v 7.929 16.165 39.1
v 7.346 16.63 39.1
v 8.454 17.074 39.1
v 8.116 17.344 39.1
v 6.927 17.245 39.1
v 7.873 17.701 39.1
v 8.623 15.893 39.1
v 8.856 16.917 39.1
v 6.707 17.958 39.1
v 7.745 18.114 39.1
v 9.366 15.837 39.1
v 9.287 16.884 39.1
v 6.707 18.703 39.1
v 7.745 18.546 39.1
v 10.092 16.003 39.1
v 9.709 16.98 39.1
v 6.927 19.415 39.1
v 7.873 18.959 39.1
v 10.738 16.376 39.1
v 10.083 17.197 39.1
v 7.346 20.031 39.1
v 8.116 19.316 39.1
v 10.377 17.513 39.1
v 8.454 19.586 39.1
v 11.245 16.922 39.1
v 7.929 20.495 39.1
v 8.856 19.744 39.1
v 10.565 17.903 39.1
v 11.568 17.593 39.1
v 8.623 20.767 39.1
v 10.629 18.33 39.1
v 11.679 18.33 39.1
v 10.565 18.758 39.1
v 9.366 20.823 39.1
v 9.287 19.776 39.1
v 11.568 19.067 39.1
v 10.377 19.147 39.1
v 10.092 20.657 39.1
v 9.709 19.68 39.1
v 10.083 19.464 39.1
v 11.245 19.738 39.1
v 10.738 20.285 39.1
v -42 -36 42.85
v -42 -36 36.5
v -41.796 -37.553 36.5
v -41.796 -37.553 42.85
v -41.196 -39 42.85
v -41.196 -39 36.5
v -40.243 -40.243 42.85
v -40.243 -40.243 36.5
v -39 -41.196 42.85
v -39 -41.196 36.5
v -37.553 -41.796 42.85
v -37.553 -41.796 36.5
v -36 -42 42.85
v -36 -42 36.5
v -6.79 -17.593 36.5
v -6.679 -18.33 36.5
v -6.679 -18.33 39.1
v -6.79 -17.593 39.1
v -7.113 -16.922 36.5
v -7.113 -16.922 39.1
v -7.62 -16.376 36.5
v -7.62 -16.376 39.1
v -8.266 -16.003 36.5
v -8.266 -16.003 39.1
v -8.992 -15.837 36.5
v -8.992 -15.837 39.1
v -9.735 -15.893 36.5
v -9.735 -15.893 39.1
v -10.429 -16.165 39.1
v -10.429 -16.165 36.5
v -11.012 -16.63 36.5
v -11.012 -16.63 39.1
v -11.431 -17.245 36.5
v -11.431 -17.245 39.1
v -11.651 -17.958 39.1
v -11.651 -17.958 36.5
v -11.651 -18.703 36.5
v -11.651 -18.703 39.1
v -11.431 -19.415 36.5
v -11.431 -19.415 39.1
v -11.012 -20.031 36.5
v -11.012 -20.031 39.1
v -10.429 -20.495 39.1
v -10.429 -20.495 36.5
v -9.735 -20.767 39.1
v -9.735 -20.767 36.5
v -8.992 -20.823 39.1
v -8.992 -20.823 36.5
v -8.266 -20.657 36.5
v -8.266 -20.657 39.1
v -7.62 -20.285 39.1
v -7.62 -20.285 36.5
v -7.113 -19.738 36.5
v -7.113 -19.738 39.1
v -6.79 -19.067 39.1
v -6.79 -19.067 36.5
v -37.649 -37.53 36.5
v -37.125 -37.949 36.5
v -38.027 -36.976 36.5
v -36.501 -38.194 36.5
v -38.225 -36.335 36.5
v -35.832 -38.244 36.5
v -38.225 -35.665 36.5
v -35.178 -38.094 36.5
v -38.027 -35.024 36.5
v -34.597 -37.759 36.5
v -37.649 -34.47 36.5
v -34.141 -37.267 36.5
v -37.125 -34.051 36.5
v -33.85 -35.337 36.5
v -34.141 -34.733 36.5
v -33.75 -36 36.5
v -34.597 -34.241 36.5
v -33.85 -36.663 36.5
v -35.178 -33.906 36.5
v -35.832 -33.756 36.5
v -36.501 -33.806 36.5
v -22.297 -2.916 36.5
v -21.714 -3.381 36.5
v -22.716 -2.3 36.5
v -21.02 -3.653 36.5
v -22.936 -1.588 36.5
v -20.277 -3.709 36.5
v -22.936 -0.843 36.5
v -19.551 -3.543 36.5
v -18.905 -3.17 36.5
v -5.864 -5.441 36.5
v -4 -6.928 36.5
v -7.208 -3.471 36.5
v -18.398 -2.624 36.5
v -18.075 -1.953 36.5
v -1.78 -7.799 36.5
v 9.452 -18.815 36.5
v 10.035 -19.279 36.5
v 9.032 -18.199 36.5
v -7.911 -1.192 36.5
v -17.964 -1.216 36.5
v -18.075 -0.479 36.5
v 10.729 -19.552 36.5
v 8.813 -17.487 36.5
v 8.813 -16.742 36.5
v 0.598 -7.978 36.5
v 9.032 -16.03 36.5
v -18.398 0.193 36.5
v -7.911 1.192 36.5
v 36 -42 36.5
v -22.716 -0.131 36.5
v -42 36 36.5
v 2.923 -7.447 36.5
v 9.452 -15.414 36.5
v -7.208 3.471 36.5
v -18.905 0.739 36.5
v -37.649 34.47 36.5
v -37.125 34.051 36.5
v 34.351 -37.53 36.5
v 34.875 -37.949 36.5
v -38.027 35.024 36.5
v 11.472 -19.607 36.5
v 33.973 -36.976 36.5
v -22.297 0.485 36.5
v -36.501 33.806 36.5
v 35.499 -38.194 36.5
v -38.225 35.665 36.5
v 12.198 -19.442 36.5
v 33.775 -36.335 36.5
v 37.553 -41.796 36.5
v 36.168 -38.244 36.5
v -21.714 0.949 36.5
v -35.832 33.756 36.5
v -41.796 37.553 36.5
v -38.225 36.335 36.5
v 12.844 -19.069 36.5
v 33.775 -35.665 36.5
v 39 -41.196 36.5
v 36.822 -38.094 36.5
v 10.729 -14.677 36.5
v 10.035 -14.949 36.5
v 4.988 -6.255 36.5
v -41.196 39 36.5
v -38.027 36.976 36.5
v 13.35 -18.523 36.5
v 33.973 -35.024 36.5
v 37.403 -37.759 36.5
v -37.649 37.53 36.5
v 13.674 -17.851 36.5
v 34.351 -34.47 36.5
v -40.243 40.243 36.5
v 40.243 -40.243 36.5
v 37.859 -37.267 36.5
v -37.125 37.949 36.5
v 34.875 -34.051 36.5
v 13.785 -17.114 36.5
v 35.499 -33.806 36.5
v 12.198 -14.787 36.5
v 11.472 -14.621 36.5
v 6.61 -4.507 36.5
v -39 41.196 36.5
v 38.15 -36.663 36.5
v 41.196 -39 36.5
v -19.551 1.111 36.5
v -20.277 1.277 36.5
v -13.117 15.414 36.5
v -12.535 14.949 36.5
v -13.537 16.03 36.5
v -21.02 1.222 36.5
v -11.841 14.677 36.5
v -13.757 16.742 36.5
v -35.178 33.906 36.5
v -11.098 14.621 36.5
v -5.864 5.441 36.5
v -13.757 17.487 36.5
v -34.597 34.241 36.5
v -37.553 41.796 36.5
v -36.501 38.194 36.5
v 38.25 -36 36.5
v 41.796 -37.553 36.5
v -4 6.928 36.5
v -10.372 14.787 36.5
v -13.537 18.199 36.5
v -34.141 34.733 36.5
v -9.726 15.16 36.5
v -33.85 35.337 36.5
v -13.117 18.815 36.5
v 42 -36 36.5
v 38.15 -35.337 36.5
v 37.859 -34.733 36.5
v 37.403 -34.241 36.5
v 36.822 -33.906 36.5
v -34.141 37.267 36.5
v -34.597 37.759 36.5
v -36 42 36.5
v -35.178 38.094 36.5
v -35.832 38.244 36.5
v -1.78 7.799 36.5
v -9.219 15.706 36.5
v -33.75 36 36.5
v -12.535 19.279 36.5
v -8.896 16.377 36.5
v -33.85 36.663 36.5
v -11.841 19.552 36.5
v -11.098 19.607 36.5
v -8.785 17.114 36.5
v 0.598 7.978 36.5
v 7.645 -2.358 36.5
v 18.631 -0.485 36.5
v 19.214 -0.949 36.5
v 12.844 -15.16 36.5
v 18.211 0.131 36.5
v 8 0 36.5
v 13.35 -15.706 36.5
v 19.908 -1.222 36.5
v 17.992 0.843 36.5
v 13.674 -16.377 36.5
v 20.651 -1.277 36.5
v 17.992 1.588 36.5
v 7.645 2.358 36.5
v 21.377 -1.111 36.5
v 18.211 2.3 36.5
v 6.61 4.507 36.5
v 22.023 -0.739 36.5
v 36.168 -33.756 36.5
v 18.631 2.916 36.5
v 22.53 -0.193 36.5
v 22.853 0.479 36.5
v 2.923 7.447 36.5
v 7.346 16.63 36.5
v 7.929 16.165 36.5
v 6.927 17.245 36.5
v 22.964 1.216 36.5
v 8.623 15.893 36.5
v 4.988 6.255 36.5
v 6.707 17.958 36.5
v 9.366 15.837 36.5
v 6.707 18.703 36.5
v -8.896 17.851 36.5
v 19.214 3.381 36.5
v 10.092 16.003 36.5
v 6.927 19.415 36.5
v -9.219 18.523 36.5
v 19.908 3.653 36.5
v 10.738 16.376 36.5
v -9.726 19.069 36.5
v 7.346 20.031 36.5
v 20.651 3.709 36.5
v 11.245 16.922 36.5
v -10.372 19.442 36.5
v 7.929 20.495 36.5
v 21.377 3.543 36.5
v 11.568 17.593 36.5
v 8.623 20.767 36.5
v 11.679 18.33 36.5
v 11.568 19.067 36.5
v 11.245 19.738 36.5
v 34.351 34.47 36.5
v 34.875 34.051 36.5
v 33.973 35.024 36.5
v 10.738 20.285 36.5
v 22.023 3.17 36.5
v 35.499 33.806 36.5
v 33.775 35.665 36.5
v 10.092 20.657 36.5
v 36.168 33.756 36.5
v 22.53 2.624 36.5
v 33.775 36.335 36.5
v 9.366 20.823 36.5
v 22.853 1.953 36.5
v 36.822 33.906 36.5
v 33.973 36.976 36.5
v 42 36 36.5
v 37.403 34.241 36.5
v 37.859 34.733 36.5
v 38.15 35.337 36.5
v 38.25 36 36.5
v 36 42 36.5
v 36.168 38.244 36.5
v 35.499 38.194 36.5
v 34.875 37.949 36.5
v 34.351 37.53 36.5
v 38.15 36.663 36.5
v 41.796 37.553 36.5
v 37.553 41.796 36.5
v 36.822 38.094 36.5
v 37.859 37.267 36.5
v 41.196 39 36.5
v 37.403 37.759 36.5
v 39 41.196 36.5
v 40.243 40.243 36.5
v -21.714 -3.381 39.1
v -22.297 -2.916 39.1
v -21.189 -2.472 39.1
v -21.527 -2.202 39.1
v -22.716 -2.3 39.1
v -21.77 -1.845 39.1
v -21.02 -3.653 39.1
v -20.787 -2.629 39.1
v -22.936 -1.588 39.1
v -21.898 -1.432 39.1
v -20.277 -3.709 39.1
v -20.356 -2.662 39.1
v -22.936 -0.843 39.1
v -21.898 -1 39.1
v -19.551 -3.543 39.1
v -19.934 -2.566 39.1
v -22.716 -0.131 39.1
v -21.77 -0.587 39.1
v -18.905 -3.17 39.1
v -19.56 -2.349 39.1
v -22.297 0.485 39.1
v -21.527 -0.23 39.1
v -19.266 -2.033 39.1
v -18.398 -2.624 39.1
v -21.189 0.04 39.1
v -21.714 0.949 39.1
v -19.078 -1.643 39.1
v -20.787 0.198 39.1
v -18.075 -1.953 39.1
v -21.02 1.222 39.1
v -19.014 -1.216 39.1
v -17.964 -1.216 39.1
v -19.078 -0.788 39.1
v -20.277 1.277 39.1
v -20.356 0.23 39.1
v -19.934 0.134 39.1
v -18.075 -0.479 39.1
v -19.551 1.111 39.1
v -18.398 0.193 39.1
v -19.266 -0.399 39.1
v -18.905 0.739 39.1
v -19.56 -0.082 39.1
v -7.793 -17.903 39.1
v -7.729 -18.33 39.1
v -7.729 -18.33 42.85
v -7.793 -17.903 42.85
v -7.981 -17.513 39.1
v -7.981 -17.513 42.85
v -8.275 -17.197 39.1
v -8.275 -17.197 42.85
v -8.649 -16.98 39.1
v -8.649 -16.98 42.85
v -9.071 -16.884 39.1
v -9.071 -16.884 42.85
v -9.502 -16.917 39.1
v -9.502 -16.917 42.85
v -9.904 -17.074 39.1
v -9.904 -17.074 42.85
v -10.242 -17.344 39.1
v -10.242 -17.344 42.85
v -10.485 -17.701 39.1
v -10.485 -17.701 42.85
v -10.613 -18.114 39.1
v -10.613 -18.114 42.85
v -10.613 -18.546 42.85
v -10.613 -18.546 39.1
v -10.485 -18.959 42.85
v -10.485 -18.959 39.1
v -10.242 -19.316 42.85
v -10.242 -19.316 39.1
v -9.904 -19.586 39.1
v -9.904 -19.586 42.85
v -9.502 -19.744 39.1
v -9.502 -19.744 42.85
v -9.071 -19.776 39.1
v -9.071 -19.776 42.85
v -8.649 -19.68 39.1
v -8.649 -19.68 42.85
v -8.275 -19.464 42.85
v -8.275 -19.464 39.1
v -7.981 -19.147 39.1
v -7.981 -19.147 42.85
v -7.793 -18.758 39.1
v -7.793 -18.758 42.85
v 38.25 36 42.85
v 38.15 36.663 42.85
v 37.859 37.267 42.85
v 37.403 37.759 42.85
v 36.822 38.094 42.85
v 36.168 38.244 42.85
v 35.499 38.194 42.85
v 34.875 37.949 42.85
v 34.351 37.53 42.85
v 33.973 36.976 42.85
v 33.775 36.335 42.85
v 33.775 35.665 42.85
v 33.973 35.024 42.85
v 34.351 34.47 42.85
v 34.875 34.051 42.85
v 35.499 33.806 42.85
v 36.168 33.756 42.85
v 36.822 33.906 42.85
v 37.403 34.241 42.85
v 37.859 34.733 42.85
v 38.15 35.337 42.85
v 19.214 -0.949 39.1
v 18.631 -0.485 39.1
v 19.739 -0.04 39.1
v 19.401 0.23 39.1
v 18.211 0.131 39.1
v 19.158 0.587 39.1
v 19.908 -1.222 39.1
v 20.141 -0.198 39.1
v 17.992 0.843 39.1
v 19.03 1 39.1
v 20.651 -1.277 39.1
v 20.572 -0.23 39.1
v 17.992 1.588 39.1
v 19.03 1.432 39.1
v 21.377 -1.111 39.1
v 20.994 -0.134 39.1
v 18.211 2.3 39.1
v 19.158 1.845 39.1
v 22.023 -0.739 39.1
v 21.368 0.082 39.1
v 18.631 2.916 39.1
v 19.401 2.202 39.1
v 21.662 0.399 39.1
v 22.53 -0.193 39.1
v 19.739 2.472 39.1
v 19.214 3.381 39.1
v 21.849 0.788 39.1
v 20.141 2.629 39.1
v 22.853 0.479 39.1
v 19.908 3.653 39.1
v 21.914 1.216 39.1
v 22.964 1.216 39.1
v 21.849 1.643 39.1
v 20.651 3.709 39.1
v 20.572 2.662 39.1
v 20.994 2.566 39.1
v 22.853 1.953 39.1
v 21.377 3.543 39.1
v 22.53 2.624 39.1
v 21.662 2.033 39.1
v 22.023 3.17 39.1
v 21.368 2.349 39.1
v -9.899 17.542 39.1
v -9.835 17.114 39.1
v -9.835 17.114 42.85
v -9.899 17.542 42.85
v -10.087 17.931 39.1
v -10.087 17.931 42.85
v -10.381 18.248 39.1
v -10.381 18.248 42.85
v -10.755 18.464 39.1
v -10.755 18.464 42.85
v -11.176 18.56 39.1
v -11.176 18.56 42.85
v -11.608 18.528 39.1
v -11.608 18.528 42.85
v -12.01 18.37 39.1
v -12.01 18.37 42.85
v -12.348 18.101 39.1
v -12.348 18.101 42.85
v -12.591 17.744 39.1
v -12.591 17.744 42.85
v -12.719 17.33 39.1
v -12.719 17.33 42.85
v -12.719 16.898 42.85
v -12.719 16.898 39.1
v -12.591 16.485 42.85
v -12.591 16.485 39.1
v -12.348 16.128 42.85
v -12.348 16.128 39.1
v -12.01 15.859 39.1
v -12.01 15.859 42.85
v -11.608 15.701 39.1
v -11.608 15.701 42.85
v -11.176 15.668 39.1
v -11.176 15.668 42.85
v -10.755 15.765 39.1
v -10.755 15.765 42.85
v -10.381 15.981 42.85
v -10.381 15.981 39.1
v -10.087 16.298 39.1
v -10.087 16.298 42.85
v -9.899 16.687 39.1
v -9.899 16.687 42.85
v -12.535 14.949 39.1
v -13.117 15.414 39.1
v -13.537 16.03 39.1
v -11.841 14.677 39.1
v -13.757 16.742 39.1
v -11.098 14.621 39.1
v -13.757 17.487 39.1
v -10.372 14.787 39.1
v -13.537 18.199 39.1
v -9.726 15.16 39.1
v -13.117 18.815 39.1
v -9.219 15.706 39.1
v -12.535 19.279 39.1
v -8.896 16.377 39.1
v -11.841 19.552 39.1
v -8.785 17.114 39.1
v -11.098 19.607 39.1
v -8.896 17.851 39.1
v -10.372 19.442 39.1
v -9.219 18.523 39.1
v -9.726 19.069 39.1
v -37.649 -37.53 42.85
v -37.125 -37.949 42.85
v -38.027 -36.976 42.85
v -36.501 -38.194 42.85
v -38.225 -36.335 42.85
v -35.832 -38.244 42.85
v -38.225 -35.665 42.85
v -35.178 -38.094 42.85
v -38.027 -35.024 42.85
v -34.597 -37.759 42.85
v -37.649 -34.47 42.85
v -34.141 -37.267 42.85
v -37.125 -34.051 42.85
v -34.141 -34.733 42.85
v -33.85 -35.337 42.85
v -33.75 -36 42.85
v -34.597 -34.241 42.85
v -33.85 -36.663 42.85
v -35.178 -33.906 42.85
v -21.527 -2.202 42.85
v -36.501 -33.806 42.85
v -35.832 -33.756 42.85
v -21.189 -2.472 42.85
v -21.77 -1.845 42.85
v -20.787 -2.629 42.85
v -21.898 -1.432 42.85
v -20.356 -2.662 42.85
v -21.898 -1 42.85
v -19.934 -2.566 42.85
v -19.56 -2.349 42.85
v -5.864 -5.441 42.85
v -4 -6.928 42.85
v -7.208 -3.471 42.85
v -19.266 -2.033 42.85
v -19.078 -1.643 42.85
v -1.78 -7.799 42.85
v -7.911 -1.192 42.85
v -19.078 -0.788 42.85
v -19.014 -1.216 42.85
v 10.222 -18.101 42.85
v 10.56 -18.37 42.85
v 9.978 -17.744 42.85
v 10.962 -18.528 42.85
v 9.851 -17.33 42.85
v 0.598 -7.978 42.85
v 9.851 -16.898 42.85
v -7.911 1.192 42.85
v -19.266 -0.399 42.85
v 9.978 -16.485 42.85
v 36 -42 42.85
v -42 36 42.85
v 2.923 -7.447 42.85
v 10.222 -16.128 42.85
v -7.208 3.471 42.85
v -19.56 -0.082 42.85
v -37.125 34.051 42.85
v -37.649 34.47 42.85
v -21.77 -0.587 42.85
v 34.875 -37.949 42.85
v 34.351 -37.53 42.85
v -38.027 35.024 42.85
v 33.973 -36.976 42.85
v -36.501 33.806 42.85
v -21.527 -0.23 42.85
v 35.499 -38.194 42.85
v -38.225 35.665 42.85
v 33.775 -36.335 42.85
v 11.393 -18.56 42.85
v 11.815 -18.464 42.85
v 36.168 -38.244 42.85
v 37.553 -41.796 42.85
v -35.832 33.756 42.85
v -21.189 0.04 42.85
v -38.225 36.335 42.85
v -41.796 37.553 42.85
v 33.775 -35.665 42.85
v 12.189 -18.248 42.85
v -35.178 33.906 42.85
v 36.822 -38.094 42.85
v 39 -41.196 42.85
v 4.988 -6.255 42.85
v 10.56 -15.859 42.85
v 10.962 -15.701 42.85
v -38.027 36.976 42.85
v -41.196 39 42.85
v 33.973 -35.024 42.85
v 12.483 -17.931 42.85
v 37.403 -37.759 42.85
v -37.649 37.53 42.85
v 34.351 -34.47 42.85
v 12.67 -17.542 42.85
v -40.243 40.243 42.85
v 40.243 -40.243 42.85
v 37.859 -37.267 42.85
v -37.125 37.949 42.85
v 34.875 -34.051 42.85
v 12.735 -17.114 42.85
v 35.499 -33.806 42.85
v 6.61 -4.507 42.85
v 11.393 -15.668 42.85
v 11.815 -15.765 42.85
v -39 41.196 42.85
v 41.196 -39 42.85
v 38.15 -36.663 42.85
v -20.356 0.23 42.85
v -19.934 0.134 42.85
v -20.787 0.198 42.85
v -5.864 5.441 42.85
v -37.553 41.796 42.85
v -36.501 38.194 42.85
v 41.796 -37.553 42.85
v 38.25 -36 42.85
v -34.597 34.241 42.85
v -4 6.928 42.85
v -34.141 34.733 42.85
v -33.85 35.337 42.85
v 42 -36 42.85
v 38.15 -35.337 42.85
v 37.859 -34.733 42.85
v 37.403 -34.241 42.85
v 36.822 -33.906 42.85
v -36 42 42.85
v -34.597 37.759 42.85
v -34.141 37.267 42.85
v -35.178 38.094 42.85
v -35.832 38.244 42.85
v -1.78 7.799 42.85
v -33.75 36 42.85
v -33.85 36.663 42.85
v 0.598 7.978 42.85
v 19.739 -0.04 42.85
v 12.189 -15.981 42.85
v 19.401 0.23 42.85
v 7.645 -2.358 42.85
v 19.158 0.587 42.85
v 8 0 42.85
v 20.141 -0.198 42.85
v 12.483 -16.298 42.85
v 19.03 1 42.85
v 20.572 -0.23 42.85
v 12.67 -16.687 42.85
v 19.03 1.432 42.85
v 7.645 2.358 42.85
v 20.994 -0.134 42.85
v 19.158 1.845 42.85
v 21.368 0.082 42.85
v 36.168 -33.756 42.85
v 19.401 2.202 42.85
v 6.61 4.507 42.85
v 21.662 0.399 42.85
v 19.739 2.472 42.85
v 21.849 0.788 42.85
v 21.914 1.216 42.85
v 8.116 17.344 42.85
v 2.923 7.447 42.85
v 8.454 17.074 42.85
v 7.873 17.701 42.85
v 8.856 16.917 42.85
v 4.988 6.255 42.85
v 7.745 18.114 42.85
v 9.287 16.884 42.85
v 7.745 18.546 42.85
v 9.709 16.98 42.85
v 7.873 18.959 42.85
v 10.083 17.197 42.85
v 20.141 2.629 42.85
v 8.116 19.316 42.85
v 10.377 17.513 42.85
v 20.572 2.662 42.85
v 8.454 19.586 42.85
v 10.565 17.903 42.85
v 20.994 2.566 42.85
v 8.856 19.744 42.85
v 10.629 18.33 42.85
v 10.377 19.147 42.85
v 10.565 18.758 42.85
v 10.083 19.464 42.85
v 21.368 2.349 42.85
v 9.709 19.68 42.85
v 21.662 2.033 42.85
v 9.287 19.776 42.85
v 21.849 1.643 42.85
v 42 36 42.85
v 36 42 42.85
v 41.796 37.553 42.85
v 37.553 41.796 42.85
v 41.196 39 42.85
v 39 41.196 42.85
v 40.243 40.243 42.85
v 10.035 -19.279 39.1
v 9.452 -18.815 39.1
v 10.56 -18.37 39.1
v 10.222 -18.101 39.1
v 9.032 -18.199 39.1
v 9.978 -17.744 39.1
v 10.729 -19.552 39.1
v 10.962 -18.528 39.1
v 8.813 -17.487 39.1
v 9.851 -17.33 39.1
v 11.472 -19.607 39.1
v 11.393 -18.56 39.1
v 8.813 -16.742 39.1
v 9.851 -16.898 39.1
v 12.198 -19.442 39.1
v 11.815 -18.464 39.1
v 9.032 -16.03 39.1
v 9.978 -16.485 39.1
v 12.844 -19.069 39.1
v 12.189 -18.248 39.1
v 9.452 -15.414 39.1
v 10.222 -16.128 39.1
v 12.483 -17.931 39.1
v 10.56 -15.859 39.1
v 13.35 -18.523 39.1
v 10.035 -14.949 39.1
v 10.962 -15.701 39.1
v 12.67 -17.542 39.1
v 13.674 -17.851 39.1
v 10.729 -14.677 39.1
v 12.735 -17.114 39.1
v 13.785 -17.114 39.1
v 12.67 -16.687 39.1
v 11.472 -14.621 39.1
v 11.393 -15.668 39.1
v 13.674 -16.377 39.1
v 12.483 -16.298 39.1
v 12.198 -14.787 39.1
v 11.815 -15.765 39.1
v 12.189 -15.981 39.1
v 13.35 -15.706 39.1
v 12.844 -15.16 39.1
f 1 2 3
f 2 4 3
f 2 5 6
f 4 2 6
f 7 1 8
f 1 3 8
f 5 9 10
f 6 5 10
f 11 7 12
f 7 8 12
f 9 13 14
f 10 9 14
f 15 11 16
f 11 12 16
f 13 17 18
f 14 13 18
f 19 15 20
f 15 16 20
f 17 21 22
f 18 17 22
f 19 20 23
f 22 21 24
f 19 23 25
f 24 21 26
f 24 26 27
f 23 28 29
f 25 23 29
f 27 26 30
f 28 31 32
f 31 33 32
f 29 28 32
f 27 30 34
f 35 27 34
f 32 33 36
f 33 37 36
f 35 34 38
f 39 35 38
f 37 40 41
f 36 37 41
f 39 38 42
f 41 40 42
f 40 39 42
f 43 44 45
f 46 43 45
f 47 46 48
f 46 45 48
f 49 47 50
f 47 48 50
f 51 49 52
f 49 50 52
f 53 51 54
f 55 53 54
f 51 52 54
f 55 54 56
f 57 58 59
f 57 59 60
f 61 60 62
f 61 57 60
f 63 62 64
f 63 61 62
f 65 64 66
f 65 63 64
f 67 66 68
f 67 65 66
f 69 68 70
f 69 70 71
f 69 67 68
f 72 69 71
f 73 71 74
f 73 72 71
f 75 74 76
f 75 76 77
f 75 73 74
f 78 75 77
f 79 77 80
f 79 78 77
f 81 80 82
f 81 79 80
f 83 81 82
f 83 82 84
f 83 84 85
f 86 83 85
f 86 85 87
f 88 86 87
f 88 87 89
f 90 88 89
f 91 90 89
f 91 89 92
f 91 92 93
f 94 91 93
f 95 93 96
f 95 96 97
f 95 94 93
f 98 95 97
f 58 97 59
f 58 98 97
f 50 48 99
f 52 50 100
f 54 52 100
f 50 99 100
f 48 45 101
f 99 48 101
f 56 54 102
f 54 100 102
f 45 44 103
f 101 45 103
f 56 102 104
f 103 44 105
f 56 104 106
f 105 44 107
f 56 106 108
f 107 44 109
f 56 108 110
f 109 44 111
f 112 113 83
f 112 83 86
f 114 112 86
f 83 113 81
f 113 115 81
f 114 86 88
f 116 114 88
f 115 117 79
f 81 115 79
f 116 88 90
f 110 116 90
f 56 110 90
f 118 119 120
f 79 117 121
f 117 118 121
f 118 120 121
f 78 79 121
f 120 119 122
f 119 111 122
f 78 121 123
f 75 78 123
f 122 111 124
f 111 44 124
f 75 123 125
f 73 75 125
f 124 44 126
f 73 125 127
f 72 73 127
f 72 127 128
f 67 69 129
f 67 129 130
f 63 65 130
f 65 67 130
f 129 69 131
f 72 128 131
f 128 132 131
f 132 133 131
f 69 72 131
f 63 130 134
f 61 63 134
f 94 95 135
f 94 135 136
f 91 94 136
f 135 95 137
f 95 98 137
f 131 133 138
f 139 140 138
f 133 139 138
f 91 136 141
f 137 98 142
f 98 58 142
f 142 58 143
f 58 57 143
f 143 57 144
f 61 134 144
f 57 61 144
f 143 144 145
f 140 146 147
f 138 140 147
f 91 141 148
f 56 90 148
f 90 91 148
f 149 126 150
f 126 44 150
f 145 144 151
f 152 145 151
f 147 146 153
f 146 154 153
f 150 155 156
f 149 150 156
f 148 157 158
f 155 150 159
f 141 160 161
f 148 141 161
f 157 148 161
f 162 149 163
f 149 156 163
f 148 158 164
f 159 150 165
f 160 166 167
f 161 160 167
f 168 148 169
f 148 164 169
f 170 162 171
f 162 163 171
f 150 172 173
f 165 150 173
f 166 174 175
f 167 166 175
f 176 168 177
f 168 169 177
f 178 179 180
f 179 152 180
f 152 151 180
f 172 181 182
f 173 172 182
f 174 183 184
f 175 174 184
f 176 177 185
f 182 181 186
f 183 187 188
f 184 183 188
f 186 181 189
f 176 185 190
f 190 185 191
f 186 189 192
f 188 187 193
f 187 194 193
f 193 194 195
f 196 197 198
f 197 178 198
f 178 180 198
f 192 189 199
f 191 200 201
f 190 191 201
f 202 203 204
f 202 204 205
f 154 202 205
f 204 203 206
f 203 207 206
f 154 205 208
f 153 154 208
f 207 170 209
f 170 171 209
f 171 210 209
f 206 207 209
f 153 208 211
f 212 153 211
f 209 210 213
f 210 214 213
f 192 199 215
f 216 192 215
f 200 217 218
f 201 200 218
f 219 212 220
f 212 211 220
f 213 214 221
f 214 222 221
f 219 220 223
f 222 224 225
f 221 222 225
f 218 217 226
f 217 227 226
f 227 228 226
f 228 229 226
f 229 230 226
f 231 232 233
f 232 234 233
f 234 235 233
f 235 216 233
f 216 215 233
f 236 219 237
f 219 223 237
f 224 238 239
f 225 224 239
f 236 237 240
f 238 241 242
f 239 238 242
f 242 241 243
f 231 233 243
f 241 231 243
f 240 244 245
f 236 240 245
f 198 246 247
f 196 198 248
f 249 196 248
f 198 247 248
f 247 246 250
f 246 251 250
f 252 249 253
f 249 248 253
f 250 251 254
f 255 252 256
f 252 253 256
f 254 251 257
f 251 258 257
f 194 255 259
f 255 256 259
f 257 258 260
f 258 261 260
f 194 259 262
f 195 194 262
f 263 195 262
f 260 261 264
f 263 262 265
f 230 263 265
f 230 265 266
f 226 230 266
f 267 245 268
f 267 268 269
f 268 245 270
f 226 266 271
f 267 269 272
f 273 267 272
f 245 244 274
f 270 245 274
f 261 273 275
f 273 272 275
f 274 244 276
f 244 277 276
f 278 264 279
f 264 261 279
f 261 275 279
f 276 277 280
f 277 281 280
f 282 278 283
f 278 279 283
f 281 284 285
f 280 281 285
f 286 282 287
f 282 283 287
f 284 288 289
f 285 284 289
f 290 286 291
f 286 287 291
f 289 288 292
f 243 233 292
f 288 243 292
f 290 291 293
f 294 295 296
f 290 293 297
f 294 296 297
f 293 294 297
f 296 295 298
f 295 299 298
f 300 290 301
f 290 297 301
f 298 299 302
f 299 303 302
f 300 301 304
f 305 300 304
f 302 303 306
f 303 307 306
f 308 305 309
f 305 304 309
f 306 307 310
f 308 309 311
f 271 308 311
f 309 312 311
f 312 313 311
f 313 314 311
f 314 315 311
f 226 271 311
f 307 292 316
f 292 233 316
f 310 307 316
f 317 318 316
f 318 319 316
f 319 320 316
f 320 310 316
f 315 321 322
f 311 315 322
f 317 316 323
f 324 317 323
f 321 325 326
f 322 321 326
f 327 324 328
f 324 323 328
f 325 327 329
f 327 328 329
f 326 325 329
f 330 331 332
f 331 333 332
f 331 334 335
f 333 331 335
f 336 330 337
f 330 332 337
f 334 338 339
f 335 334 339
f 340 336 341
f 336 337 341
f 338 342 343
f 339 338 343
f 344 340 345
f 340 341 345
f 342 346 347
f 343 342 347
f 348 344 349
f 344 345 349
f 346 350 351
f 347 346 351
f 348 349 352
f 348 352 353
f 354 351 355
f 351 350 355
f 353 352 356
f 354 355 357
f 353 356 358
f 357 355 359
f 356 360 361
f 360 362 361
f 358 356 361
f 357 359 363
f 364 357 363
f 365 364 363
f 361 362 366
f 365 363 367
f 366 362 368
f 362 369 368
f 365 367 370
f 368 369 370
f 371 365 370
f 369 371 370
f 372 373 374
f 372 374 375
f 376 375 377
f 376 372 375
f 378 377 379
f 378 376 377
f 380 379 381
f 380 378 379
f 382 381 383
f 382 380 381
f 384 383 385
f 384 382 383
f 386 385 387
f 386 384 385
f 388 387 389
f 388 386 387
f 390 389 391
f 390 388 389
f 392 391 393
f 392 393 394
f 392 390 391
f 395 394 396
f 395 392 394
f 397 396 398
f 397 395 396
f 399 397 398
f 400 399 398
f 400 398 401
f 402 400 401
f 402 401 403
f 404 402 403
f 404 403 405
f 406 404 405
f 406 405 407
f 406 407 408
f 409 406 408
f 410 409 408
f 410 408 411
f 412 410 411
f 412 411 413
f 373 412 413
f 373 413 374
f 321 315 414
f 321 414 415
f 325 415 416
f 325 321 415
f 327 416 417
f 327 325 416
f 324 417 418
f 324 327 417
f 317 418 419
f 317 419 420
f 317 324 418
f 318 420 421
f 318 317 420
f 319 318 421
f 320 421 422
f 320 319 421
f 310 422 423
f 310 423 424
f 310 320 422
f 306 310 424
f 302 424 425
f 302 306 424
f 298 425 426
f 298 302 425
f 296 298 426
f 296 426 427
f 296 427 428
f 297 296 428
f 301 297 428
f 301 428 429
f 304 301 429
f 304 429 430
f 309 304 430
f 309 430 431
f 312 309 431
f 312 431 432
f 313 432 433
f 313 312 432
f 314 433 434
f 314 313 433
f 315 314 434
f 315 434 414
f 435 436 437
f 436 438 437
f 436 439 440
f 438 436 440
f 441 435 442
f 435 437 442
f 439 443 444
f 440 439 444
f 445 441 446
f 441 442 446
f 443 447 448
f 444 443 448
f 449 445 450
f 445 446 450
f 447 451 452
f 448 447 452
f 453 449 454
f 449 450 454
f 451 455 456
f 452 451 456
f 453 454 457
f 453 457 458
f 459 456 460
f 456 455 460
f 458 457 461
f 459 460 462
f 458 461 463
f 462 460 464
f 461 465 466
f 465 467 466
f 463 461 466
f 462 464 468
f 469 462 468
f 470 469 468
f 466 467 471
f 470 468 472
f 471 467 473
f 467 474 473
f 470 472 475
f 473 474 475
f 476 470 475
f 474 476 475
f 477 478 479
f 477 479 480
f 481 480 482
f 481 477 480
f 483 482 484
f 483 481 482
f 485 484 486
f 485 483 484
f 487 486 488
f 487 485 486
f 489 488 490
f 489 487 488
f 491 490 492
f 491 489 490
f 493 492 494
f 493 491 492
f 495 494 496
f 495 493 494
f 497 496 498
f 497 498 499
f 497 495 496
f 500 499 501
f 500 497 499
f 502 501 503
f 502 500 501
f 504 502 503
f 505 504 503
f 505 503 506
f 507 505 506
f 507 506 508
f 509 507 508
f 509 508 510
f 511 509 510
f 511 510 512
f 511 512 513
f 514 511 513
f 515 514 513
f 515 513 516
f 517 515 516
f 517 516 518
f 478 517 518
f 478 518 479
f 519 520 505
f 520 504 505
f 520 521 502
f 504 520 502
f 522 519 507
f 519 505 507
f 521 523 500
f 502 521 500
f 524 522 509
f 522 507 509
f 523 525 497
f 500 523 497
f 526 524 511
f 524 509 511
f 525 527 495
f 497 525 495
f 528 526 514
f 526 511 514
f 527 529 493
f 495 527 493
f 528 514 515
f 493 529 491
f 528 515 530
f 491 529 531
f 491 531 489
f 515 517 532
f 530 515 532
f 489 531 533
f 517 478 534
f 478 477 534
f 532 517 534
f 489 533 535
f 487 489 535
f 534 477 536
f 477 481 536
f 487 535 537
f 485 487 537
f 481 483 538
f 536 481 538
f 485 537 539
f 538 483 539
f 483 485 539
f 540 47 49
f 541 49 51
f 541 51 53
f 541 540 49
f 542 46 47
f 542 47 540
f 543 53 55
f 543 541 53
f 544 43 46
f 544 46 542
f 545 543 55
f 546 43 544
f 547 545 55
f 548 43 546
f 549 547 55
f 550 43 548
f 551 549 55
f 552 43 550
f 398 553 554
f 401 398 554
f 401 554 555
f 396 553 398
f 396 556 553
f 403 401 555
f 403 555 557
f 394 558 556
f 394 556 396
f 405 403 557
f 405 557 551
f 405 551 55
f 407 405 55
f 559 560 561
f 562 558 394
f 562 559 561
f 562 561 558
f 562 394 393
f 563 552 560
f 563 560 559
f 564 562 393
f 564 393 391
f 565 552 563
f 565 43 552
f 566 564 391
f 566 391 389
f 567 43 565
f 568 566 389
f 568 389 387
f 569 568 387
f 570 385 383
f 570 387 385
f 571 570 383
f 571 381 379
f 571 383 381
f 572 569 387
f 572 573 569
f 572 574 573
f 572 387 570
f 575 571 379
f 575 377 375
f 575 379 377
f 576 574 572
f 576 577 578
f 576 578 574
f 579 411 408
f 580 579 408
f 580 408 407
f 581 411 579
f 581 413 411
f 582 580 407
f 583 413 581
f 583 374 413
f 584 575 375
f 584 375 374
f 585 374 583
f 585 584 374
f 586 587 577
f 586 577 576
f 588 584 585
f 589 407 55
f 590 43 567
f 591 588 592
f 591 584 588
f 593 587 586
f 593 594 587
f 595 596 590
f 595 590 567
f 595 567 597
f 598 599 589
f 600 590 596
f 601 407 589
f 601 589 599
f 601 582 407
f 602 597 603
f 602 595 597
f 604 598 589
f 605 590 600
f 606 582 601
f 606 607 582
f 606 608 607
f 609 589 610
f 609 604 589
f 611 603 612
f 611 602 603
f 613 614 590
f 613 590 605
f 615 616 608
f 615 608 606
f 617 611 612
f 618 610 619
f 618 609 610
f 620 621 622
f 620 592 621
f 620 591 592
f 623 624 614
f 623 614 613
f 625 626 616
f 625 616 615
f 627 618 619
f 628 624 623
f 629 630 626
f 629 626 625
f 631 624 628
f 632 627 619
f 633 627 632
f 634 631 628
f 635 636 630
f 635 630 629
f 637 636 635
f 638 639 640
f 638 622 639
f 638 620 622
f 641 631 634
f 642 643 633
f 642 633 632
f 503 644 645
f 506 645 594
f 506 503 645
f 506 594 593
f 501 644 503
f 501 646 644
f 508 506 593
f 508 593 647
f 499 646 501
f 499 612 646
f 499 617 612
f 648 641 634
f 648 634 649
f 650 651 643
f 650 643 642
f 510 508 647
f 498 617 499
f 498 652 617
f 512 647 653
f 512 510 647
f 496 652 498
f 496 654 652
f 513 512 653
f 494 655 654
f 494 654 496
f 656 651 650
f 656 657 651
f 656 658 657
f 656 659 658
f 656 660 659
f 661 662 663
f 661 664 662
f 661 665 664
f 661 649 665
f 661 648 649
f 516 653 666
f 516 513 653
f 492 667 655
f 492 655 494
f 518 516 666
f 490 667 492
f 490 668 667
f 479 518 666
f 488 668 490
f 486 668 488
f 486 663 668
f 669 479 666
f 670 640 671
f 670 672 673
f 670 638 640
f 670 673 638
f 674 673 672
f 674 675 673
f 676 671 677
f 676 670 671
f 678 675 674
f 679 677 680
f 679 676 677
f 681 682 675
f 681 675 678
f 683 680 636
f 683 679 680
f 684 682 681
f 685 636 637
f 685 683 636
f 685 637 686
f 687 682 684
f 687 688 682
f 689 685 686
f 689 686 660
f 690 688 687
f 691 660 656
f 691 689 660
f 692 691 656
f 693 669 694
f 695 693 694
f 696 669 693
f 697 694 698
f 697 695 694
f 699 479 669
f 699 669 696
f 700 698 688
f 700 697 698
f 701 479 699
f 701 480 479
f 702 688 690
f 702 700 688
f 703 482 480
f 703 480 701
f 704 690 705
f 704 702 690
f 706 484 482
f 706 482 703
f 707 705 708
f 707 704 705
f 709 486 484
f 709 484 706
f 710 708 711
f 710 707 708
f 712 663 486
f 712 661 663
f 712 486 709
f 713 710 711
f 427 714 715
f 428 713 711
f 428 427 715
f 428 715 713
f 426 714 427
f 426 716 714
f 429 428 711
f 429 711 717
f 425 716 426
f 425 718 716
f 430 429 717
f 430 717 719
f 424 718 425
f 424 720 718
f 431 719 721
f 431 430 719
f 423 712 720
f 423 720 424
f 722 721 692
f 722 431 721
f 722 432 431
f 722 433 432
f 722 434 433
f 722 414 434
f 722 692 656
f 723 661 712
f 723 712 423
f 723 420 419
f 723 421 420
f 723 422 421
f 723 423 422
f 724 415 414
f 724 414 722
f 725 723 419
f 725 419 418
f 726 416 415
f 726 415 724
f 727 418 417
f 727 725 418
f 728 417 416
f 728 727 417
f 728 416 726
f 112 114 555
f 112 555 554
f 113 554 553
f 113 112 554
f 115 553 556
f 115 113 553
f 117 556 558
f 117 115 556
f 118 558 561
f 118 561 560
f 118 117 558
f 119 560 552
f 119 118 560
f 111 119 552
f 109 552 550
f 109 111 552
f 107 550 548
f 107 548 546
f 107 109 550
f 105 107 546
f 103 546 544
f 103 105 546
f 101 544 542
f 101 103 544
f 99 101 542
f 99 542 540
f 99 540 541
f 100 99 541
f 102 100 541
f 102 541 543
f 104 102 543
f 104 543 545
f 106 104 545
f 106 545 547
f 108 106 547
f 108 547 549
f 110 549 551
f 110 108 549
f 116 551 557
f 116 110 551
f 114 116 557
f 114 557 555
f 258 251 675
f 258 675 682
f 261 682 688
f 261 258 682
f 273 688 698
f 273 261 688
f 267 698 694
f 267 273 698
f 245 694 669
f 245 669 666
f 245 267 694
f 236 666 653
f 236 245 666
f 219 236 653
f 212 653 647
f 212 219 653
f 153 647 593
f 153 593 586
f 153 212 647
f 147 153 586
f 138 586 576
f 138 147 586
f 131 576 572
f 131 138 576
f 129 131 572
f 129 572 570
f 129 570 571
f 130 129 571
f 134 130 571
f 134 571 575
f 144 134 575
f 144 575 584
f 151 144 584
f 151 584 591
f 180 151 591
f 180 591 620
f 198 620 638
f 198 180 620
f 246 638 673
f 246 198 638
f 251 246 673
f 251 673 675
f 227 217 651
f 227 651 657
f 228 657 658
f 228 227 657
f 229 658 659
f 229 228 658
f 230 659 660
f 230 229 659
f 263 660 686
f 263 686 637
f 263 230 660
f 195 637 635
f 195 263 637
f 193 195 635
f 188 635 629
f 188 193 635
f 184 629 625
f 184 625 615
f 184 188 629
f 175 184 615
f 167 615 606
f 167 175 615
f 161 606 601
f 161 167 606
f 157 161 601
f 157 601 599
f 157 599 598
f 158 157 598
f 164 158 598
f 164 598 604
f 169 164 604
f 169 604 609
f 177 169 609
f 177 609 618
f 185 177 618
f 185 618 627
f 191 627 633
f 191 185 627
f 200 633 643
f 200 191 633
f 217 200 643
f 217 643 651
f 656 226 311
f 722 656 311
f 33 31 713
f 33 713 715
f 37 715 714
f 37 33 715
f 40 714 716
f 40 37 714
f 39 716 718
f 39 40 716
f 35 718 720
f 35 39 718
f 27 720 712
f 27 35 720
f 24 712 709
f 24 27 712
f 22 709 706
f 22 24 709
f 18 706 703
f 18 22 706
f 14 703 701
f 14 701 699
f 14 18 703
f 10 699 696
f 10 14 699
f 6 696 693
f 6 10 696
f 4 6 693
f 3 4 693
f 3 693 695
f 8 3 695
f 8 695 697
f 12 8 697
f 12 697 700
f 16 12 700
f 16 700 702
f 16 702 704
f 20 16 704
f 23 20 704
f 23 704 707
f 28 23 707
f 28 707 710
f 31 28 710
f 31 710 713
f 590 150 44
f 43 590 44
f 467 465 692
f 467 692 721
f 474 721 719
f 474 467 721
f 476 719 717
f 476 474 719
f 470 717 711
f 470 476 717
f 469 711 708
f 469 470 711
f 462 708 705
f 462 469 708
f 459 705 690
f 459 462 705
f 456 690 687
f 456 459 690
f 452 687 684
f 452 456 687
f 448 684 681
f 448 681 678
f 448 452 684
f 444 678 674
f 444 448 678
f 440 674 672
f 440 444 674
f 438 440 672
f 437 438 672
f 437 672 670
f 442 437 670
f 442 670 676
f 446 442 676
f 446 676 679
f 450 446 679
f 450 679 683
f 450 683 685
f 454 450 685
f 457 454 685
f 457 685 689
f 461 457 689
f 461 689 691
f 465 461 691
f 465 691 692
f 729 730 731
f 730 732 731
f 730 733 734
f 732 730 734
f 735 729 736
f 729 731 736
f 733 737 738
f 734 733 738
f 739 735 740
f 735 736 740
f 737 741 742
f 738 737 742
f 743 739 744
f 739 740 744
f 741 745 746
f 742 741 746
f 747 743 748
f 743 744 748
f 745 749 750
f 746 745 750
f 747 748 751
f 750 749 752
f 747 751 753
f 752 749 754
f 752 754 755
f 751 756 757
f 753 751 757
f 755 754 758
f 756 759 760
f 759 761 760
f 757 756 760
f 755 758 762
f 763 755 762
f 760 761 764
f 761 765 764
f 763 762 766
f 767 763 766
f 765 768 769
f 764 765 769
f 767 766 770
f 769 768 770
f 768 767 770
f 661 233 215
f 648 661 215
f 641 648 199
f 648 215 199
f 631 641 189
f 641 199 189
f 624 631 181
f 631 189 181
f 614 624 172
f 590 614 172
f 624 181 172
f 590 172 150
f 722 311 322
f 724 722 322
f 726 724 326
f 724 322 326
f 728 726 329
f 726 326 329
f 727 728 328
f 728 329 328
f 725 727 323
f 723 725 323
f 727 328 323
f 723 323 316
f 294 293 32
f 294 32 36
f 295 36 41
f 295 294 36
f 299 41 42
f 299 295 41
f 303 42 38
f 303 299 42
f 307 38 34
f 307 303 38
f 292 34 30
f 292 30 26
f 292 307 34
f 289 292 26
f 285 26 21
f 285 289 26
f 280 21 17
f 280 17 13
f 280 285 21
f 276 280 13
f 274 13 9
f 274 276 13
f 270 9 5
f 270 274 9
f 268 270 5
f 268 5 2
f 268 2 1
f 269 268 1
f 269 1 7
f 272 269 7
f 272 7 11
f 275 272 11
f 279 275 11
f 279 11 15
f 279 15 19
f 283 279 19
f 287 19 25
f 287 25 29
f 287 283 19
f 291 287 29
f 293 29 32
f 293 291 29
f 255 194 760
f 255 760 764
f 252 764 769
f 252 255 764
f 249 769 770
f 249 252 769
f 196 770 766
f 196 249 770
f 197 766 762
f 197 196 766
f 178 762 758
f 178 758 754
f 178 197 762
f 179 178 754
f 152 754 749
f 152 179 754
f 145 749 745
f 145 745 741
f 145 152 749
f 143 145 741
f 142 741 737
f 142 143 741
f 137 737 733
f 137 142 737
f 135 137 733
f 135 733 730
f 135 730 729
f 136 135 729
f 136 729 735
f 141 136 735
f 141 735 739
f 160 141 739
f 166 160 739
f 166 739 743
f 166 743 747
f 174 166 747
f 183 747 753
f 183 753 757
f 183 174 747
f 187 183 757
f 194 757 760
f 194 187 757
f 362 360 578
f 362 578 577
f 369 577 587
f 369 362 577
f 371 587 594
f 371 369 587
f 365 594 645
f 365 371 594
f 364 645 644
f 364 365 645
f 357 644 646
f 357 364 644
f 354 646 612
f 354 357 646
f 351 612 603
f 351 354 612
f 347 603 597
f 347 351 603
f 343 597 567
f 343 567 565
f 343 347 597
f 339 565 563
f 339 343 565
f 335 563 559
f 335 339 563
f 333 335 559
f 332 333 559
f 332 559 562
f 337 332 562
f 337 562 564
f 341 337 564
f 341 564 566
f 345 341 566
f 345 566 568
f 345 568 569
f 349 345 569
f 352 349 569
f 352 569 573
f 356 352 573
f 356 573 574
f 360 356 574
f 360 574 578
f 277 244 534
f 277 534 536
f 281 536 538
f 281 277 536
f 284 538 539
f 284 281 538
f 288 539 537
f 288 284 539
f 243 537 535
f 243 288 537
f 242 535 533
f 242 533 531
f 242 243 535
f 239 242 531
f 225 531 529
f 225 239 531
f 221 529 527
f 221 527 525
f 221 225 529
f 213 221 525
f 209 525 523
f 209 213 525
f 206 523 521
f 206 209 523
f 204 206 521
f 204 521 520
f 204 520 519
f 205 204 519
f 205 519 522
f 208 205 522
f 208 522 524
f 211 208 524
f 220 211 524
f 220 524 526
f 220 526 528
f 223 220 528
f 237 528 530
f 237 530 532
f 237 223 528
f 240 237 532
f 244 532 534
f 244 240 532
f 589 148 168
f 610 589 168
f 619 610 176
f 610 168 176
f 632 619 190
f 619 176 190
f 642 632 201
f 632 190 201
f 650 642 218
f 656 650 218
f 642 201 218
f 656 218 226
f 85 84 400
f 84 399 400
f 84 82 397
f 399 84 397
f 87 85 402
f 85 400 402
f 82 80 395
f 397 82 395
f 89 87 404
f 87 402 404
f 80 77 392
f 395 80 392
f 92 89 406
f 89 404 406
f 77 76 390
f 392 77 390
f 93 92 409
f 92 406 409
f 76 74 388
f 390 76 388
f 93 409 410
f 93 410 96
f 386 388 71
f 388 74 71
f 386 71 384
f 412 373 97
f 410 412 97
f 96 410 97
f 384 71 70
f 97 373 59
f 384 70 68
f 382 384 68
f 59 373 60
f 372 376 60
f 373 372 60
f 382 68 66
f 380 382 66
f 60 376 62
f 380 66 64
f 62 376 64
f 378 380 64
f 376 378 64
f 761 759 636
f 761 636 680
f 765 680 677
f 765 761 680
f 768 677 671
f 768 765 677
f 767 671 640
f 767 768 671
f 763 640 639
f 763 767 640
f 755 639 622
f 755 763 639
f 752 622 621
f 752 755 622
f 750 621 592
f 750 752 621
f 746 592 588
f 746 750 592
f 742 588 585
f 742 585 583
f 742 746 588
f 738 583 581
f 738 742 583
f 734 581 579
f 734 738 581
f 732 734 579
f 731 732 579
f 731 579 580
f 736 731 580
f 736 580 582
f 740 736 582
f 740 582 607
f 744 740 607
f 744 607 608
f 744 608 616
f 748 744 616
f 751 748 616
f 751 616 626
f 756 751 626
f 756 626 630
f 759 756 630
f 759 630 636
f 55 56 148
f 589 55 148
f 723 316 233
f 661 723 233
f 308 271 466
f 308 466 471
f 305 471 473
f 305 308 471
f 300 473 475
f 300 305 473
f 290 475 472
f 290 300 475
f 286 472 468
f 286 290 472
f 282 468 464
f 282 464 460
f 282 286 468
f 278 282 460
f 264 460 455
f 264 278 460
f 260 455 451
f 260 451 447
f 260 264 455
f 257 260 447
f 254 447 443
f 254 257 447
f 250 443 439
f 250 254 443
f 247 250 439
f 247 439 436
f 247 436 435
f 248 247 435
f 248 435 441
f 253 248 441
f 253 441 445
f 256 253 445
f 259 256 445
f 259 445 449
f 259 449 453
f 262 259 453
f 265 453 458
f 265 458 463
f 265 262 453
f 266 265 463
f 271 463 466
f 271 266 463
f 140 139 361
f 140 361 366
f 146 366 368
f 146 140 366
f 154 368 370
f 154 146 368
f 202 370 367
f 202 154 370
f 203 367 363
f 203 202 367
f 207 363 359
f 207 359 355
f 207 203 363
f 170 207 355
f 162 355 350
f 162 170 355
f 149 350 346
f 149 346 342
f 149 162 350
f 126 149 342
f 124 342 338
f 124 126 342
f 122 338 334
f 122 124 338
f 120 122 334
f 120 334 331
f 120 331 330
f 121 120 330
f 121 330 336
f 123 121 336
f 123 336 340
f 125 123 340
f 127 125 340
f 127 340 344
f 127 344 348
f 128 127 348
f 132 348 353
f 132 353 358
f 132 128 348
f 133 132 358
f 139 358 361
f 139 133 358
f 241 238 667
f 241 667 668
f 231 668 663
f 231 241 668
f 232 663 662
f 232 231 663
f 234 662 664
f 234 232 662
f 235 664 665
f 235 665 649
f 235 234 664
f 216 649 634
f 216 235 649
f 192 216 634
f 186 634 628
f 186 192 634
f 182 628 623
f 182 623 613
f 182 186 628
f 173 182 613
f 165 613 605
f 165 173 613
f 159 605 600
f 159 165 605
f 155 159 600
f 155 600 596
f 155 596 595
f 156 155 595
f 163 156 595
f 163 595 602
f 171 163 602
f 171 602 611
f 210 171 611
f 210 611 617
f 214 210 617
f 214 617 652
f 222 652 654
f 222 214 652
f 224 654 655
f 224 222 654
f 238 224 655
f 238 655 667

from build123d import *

# Parameters (mm, degrees)
PLACA_SOPORTE_M1_START             = 36.5
PLACA_SOPORTE_M1_DEPTH             = 6.35
BARRENOS_SEPARADORES_Y_MOTOR_START = 36.5
CROQUIS2_R                         = 2.25
CROQUIS2_R_2                       = 1.45
CROQUIS2_R_3                       = 8
BARRENOS_SEPARADORES_Y_MOTOR_DEPTH = 6.35
REFRENTADO_M2_5_START              = 36.5
CROQUIS3_R                         = 2.5
REFRENTADO_M2_5_DEPTH              = 2.6


with BuildPart() as part:
    # Croquis1 → Placa_soporte_M1 (new body)
    with BuildSketch(Plane.XY.offset(PLACA_SOPORTE_M1_START)):
        with BuildLine():
            Line((-36, -42), (36, -42))
            ThreePointArc((36, -42), (40.242640687, -40.242640687), (42, -36))
            Line((42, -36), (42, 36))
            ThreePointArc((42, 36), (40.242640687, 40.242640687), (36, 42))
            Line((36, 42), (-36, 42))
            ThreePointArc((-36, 42), (-40.242640687, 40.242640687), (-42, 36))
            Line((-42, 36), (-42, -36))
            ThreePointArc((-42, -36), (-40.242640687, -40.242640687), (-36, -42))
        make_face()
    extrude(amount=PLACA_SOPORTE_M1_DEPTH)

    # Croquis2 → Barrenos_separadores_y_motor (cut)
    with BuildSketch(Plane.XY.offset(BARRENOS_SEPARADORES_Y_MOTOR_START)):
        with Locations((-36, -36)):
            Circle(CROQUIS2_R)
        with Locations((-36, 36)):
            Circle(CROQUIS2_R)
        with Locations((36, -36)):
            Circle(CROQUIS2_R)
        with Locations((36, 36)):
            Circle(CROQUIS2_R)
        with Locations((20.463916472, 1.215780658)):
            Circle(CROQUIS2_R_2)
        with Locations((9.179061301, 18.330161855)):
            Circle(CROQUIS2_R_2)
        with Locations((-11.284855172, 17.114381197)):
            Circle(CROQUIS2_R_2)
        with Locations((-20.463916472, -1.215780658)):
            Circle(CROQUIS2_R_2)
        with Locations((-9.179061301, -18.330161855)):
            Circle(CROQUIS2_R_2)
        with Locations((11.284855172, -17.114381197)):
            Circle(CROQUIS2_R_2)
        Circle(CROQUIS2_R_3)
    extrude(amount=BARRENOS_SEPARADORES_Y_MOTOR_DEPTH, mode=Mode.SUBTRACT)

    # Croquis3 → Refrentado_M2-5 (cut)
    with BuildSketch(Plane.XY.offset(REFRENTADO_M2_5_START)):
        with Locations((20.463916472, 1.215780658)):
            Circle(CROQUIS3_R)
        with Locations((9.179061301, 18.330161855)):
            Circle(CROQUIS3_R)
        with Locations((-11.284855172, 17.114381197)):
            Circle(CROQUIS3_R)
        with Locations((-20.463916472, -1.215780658)):
            Circle(CROQUIS3_R)
        with Locations((-9.179061301, -18.330161855)):
            Circle(CROQUIS3_R)
        with Locations((11.284855172, -17.114381197)):
            Circle(CROQUIS3_R)
    extrude(amount=REFRENTADO_M2_5_DEPTH, mode=Mode.SUBTRACT)


solid = part.part
